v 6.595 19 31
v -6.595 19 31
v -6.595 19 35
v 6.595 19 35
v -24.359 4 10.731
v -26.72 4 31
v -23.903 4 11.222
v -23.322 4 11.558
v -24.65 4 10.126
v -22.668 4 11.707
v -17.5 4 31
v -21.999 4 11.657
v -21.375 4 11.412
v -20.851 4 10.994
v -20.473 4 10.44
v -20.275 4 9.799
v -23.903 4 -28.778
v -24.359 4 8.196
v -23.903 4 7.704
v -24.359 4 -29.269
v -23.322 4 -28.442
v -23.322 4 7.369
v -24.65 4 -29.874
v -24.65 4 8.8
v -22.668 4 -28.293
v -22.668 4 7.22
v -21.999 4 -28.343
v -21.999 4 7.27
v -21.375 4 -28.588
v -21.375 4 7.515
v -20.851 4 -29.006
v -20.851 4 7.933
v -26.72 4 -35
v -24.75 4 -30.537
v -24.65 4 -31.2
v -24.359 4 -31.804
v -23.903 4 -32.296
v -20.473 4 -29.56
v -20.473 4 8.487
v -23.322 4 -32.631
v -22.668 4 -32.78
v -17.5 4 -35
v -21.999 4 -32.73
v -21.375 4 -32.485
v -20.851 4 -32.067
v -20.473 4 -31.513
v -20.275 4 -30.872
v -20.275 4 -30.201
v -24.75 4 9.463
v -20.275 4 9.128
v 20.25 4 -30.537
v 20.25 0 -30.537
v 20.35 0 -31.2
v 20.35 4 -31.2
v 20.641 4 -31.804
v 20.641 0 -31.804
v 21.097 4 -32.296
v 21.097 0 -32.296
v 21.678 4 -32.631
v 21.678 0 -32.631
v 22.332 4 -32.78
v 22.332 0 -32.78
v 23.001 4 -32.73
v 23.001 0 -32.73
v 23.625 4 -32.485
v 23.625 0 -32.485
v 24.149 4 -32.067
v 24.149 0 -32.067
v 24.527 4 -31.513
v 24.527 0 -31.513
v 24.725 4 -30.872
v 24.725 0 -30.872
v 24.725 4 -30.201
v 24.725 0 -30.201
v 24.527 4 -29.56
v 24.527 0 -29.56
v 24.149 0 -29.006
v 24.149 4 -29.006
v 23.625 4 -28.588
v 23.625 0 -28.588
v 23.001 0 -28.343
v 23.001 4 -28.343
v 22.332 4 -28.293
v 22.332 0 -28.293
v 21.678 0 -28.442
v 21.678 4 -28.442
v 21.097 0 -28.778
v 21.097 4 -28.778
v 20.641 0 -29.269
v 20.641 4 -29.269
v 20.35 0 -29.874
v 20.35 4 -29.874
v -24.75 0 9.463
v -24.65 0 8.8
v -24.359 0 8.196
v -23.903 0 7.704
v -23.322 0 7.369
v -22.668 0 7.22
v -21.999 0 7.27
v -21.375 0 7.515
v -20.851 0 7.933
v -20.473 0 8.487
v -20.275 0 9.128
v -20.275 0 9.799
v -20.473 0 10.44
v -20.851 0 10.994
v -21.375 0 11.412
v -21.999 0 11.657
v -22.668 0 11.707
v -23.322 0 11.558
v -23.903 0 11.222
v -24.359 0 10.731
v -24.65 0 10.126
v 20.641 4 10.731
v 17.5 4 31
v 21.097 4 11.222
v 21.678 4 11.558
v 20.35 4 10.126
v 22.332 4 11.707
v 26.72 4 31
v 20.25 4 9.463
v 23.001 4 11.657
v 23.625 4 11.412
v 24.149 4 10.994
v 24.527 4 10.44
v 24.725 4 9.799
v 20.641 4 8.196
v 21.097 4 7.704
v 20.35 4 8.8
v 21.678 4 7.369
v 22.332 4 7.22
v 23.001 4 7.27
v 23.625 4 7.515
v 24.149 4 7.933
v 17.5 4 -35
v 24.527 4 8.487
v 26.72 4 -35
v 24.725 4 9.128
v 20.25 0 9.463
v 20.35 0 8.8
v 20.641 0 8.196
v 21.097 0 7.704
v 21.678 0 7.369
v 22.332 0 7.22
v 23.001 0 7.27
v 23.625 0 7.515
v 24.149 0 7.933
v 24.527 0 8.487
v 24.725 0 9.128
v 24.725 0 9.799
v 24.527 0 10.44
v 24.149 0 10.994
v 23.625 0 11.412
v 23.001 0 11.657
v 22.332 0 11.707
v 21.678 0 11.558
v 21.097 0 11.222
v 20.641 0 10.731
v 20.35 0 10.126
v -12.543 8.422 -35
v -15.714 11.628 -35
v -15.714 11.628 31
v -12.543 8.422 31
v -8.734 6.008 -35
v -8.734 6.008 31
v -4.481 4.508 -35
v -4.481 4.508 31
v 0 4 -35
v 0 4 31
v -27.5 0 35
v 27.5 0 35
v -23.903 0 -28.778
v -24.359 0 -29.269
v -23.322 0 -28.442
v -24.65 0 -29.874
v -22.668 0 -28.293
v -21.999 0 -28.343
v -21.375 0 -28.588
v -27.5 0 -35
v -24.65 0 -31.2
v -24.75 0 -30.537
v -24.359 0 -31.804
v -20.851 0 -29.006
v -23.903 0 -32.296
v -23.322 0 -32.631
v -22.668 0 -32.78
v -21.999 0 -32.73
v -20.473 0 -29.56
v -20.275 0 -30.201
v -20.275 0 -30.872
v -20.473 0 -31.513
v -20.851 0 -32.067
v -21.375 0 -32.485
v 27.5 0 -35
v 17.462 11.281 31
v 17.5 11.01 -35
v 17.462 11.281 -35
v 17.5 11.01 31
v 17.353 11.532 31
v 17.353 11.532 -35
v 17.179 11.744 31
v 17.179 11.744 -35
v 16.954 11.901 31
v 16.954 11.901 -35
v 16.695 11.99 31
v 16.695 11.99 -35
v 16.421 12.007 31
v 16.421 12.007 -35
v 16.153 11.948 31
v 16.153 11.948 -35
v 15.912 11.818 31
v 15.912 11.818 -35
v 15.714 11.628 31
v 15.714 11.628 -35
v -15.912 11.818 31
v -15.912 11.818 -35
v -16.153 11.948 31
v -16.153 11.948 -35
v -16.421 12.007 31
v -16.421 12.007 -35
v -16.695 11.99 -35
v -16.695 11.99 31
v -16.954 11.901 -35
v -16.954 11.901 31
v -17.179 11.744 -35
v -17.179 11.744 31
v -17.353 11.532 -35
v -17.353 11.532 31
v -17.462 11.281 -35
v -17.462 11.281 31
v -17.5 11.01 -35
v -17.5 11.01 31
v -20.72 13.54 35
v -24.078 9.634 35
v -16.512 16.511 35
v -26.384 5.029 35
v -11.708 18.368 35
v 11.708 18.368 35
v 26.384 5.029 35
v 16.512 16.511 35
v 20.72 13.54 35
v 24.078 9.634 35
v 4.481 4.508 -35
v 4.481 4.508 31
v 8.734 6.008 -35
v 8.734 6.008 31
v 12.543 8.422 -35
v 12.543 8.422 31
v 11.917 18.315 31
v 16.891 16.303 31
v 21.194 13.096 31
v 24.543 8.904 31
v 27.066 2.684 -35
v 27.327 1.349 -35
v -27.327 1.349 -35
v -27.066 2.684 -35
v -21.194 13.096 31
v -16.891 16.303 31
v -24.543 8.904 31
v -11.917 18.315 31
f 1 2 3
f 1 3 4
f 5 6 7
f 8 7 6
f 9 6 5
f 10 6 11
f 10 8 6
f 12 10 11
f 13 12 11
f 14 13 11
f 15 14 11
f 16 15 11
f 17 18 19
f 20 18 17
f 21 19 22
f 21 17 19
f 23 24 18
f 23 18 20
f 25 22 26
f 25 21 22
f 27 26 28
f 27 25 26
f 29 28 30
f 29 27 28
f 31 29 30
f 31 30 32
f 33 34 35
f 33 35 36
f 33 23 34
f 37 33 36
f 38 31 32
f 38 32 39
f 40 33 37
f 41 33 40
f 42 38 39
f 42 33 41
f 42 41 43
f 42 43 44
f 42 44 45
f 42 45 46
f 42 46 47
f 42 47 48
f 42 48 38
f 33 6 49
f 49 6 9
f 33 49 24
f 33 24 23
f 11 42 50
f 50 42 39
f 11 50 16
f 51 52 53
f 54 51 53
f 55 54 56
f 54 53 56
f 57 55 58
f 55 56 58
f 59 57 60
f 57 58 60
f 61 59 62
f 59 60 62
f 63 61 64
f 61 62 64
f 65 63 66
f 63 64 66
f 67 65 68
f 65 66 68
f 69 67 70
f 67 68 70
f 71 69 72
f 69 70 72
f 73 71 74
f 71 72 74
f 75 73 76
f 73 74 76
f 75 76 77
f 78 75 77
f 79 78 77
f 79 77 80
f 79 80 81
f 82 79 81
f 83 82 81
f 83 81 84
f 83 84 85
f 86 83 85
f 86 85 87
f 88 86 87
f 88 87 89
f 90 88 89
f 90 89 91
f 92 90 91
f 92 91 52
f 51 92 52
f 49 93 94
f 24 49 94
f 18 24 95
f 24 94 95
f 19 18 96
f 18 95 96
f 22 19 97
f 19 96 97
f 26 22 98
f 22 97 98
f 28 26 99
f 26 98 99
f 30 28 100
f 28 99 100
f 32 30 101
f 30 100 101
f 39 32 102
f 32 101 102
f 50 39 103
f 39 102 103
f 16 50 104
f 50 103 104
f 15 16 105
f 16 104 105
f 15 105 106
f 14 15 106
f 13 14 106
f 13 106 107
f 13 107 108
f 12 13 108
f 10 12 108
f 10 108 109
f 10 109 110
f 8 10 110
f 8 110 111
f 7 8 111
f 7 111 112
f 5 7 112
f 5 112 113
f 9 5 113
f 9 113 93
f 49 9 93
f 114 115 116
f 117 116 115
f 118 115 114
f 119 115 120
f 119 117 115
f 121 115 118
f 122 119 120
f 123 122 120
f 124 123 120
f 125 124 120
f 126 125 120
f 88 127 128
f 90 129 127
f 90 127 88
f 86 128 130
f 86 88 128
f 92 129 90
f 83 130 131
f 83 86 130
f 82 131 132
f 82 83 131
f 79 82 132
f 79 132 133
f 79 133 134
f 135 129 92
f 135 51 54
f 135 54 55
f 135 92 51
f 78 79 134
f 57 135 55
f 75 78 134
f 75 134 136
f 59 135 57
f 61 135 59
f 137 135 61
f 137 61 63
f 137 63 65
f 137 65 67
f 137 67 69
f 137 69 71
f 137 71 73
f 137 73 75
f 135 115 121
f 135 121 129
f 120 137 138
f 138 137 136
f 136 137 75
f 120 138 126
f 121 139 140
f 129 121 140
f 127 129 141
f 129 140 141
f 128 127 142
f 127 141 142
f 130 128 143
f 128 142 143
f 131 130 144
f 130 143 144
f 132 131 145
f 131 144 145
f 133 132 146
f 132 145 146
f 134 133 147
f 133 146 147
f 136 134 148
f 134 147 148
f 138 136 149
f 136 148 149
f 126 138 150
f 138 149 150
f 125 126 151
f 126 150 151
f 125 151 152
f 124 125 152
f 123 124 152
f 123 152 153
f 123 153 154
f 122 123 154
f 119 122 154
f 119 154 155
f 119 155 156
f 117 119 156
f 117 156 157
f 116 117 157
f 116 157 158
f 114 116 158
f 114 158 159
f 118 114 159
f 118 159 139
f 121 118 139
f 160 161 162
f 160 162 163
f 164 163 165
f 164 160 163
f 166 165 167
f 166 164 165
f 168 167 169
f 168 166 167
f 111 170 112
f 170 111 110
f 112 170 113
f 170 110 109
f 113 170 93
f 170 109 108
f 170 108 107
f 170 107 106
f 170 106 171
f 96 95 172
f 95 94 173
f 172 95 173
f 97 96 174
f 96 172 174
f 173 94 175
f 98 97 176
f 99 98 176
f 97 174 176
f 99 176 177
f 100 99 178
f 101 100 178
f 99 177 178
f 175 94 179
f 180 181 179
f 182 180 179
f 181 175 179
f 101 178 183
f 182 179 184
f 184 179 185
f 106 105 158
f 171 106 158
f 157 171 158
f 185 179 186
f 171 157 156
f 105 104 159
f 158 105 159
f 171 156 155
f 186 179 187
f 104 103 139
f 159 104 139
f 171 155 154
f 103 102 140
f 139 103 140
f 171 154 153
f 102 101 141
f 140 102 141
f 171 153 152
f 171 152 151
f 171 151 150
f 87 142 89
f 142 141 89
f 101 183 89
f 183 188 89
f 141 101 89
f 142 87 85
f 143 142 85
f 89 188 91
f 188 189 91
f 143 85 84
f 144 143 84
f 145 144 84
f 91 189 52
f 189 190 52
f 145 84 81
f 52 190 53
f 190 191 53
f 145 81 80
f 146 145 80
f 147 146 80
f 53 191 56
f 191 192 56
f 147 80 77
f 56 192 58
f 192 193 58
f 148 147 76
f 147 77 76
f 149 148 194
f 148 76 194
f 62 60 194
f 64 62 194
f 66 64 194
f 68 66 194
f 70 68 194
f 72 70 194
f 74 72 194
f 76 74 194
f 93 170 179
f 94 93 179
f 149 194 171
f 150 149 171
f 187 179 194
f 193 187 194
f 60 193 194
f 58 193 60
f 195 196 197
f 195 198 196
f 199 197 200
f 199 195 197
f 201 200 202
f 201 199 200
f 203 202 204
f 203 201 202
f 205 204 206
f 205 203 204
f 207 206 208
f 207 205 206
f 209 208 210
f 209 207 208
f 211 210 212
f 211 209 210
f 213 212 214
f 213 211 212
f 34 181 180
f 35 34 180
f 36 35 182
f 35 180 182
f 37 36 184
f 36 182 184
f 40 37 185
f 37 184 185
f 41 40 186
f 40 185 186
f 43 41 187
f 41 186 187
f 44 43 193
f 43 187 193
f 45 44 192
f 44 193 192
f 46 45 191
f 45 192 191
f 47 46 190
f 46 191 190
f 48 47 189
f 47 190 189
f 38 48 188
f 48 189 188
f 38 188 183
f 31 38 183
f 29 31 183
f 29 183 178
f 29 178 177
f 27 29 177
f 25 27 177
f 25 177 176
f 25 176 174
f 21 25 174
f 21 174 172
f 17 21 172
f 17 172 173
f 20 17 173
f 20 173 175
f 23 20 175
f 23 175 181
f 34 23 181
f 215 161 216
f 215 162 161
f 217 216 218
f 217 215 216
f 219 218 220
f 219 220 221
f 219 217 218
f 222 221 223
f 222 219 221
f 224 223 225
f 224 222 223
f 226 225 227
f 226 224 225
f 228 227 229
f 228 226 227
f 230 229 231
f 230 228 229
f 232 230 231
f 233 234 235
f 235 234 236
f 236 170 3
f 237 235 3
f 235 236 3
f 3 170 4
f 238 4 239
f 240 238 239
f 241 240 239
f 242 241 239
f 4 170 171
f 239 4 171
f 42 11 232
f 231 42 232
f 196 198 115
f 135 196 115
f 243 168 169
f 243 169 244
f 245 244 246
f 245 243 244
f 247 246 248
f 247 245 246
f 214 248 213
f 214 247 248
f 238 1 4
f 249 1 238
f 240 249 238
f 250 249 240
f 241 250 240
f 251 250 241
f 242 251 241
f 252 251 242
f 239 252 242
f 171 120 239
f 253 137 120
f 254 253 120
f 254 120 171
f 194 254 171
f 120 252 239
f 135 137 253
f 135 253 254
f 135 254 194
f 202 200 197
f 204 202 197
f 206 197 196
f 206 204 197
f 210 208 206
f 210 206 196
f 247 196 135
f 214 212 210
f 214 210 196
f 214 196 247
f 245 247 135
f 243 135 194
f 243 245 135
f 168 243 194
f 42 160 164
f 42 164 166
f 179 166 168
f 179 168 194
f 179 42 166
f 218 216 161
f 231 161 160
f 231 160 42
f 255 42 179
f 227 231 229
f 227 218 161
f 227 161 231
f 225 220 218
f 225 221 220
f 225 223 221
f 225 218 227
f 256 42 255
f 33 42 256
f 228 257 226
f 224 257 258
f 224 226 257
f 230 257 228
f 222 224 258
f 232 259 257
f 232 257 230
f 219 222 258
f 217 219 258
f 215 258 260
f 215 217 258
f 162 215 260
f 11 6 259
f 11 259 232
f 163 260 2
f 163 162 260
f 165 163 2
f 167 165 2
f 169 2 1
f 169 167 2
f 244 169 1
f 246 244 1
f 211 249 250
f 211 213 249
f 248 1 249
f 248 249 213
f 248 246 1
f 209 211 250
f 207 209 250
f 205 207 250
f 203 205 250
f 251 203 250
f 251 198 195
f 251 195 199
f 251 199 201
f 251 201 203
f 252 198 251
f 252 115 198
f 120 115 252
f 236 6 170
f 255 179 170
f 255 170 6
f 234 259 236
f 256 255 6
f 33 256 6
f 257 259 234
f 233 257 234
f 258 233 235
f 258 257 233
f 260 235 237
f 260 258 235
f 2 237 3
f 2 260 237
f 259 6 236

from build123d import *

# Parameters (mm, degrees)
SKETCH1_W            = 55
SKETCH1_H            = 70
BOSS_EXTRUDE1_DEPTH  = 4
M4_CLEARANCE_HOLE1_D = 4.5
BOSS_EXTRUDE2_DEPTH  = 70
SKETCH5_W            = 55
SKETCH5_H            = 4
BOSS_EXTRUDE3_DEPTH  = 15
FILLET1_R            = 1
FILLET2_START        = -36
FILLET2_DEPTH        = 71


with BuildPart() as part:
    # Sketch1 → Boss-Extrude1 (new body)
    with BuildSketch(Plane(origin=(0, 0, 0), x_dir=(1, 0, 0), z_dir=(0, 1, 0))):
        Rectangle(SKETCH1_W, SKETCH1_H)
    extrude(amount=BOSS_EXTRUDE1_DEPTH)

    # M4 Clearance Hole1 (through all)
    with Locations(Plane(origin=(0, 4, 0), x_dir=(1, 0, 0), z_dir=(0, 1, 0))):
        with Locations((-22.5, 30.536735359), (22.5, 30.536735359), (-22.5, -9.463264641), (22.5, -9.463264641)):
            Hole(M4_CLEARANCE_HOLE1_D / 2)

    # Sketch4 → Boss-Extrude2 (add, through all)
    with BuildSketch(Plane(origin=(0, 0, -35), x_dir=(-1, 0, 0), z_dir=(0, 0, -1))):
        with BuildLine():
            Line((-17.5, 14.317541634), (-17.5, 4))
            Line((-17.5, 4), (0, 4))
            ThreePointArc((0, 4), (-10.157530032, 6.771402156), (-17.5, 14.317541634))
        make_face()
        with BuildLine():
            ThreePointArc((17.5, 14.317541634), (10.157530032, 6.771402156), (0, 4))
            Line((0, 4), (17.5, 4))
            Line((17.5, 4), (17.5, 14.317541634))
        make_face()
    extrude(amount=-BOSS_EXTRUDE2_DEPTH)

    # Sketch5 → Boss-Extrude3 (add)
    with BuildSketch(Plane(origin=(0, 4, 0), x_dir=(1, 0, 0), z_dir=(0, 1, 0))):
        with Locations((0, -33)):
            Rectangle(SKETCH5_W, SKETCH5_H)
    extrude(amount=BOSS_EXTRUDE3_DEPTH)

    # Fillet1
    fillet1_edges = [part.edges().sort_by_distance(p)[0] for p in [
        (-17.5, 14.317541634, -2),
        (17.5, 14.317541634, -2),
    ]]
    fillet(fillet1_edges, radius=FILLET1_R)

    # Fillet2: read off the stored shape, not the designer's step
    # Fillet2 outline → Fillet2 (cut)
    with BuildSketch(Plane.XY.offset(FILLET2_START)):
        with BuildLine():
            ThreePointArc((-27.5, 0), (-20.719901931, 13.540270268), (-6.59545504, 19))
            Line((-6.59545504, 19), (-27.5, 19))
            Line((-27.5, 19), (-27.5, 0))
        make_face()
        with BuildLine():
            ThreePointArc((6.59545504, 19), (20.719901931, 13.540270268), (27.5, 0))
            Line((27.5, 0), (27.5, 19))
            Line((27.5, 19), (6.59545504, 19))
        make_face()
    extrude(amount=FILLET2_DEPTH, mode=Mode.SUBTRACT)


solid = part.part
